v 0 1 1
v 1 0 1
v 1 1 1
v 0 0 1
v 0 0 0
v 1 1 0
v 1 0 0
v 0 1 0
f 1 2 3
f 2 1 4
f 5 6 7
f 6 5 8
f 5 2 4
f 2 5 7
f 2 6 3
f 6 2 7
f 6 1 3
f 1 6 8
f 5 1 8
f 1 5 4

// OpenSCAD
$fn=63;
X=[16.5,26.5];
Y=[12, 44];
D=1.5;
H=1.5;
K=3;
L=5;

SP=.4;


//Y=concat(Y0,YY);

//C=[X[0]*2,Y[len(Y)-1]+Y[0],H];
C=[X[0]+X[1],Y[1]+Y[0],H];
W=18;

mode="cover";
//mode="diff_marker";
if(mode=="main") {
    difference() {
        union() {
//            cube(C);
//            translate([0,-W,0])
            cube([C[0],C[1]+W,C[2]]);
        }
        for(x=X)
        for(y=Y) {
            translate([x,y,0])
            cylinder(d=D,h=10,center=true);
        }
    }
}

if(mode=="cover") {
    
    H1=9.5;
    H2=35;
    
    
    cube([35,52.5,]);
    
}


if(mode=="step") {
    
    c=[X[1]+X[0],Y[0]+Y[1]]/2;
    dx=6.5;
    dy=9;
    
    difference() {
        union() {
//            cube(C);
//            translate([0,-W,0])
            translate(c)
            cube([X[1]-X[0]+2*dx,Y[1]-Y[0]+2*dy,10],center=true);
        }

        for(x=X)
        for(y=Y) {
            translate([x,y,0])
            cylinder(d=6.5,h=100,center=true);
        }
    }
}

if(mode=="diff_marker") {
    L=150;
    difference() {
        translate([-H,0,-H])
        cube([W,L,3*H]);

        translate([0,-H,0])
        cube([W,2*L,10*H]);
        
        for(y=[25,50,75,100,125])
            translate([W/2,y,0])
            cylinder(d=3,h=20,center=true);
    }
}
